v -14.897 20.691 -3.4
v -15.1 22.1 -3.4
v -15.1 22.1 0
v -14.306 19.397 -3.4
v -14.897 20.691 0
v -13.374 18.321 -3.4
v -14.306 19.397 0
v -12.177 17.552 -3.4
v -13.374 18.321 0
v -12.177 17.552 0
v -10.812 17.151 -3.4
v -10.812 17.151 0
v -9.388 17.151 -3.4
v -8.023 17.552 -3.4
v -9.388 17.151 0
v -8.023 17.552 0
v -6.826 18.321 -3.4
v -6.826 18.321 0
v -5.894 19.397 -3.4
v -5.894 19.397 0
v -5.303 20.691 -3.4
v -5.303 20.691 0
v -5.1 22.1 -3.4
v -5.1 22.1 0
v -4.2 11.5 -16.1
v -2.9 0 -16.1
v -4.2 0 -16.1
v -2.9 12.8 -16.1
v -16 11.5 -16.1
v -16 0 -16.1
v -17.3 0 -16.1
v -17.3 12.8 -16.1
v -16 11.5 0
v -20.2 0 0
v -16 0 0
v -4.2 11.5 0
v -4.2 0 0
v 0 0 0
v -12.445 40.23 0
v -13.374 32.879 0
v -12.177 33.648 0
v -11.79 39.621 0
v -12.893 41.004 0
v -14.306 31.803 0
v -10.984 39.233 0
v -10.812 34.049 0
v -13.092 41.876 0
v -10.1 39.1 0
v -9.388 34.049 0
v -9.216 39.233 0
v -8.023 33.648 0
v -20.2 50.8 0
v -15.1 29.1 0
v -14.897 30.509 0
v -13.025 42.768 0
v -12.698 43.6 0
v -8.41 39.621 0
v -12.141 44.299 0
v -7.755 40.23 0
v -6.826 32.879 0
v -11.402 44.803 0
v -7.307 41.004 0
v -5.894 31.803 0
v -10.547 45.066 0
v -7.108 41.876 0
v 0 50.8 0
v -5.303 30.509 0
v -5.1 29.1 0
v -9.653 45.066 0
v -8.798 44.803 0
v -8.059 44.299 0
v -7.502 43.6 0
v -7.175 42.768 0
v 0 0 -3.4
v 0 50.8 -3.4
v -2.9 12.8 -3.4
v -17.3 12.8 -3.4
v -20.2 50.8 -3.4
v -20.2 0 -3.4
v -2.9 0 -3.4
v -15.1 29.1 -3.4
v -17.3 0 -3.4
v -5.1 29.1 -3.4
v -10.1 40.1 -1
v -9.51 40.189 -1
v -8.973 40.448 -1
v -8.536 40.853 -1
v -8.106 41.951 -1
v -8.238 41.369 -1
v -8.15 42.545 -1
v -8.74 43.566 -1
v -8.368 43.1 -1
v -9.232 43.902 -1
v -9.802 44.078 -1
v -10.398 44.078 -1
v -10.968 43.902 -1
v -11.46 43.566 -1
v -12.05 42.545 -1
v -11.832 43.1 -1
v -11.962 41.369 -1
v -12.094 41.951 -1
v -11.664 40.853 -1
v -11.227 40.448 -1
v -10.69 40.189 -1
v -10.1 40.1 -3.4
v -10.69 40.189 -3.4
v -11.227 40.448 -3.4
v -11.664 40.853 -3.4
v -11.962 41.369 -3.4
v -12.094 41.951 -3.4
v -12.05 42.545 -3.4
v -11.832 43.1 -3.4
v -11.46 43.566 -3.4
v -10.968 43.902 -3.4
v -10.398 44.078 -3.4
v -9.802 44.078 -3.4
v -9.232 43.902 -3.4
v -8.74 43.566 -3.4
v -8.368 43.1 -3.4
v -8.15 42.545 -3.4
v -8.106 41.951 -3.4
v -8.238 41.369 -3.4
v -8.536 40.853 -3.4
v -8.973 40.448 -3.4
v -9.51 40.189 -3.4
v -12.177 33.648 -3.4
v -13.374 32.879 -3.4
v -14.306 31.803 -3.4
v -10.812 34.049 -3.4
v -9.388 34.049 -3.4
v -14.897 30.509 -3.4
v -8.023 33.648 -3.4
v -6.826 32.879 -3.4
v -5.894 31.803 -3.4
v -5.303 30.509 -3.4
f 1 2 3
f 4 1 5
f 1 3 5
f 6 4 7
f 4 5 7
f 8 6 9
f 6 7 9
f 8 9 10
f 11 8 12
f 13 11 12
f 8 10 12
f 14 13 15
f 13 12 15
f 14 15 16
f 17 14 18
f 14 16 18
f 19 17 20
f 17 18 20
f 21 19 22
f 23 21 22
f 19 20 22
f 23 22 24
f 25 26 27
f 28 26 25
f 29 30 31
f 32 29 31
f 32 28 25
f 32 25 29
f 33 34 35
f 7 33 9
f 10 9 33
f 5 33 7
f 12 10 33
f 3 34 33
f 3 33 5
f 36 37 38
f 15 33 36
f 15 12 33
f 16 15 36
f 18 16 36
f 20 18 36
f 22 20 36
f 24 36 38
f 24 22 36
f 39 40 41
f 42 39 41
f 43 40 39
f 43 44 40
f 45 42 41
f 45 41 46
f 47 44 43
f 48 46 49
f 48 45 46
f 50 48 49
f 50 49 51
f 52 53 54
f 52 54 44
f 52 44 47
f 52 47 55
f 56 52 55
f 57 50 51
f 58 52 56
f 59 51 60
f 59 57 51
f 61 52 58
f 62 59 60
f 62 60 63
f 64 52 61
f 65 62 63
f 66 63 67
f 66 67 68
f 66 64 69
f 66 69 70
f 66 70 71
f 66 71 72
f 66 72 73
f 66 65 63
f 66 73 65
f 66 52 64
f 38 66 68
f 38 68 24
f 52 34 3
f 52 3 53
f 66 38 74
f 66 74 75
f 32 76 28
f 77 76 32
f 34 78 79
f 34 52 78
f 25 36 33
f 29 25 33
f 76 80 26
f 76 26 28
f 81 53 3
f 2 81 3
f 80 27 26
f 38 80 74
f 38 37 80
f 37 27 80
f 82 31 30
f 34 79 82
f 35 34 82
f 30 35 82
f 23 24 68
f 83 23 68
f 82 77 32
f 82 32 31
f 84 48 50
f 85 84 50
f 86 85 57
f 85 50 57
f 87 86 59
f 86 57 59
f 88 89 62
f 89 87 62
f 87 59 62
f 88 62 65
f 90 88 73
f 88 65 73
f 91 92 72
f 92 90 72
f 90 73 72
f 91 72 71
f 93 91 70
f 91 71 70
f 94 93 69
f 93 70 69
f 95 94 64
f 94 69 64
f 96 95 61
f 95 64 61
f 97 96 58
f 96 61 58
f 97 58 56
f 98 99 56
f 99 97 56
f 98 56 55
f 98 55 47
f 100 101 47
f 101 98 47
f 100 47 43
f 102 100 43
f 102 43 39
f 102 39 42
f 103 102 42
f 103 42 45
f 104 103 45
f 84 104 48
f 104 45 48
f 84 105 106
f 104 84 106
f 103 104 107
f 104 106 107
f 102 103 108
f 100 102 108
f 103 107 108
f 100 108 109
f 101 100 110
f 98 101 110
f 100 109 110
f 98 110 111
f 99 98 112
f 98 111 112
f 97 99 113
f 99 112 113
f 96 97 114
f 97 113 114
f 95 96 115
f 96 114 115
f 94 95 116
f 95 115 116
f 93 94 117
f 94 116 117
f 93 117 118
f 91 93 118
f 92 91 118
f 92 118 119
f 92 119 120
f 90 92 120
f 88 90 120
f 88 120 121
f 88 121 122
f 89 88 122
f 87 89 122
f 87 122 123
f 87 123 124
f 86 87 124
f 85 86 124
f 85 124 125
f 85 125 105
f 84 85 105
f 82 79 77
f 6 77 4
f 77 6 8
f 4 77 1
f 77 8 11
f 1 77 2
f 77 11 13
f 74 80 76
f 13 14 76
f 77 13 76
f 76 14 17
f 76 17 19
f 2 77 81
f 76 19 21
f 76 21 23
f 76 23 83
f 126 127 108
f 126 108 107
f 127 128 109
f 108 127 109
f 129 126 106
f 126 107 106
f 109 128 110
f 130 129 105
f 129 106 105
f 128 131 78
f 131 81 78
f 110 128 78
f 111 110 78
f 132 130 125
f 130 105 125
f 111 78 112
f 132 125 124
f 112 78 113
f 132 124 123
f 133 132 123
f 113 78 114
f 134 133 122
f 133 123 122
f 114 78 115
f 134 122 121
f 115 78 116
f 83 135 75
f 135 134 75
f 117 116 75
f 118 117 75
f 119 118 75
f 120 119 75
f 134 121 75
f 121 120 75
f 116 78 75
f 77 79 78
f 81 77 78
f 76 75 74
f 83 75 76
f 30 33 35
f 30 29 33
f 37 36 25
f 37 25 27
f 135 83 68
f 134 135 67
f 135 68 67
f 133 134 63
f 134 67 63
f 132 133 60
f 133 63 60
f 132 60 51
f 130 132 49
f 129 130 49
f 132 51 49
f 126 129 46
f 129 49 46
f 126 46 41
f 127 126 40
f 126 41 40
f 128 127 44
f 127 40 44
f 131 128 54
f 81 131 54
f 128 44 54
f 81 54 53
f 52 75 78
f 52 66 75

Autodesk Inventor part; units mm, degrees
ref_plane "YZ Plane" through (0, 0, 0) normal (1, 0, 0) x (0, 1, 0)
ref_plane "XZ Plane" through (0, 0, 0) normal (0, 1, 0) x (-1, 0, 0)
ref_plane "XY Plane" through (0, 0, 0) normal (0, 0, 1) x (1, 0, 0)
sketch "Boceto1" plane through (0, 0, 0) normal (0, 0, 1) x (1, 0, 0)
  line L0 (0, 50.8) -> (-20.2, 50.8)
  line L1 (-20.2, 50.8) -> (-20.2, 0)
  line L2 (-20.2, 0) -> (0, 0)
  line L3 (0, 0) -> (0, 50.8)
  dimension "d0" = 50.8
  dimension "d1" = 20.2
extrude "Extrusión1" add sketch "Boceto1" against normal blind 3.4
sketch "Boceto3" plane through (0, 0, 0) normal (0, 0, -1) x (-1, 0, 0)
  line L0 (20.2, 50.8) -> (0, 50.8) construction
  line L1 (0, 50.8) -> (0, 0) construction
  circle A0 centre (10.1, 42.1) radius 2
  line L2 (20.2, 0) -> (20.2, 50.8) projected
  dimension "d20" = 4
  dimension "d21" = 10.1
  dimension "d23" = 8.7
hole "Agujero3" at (-10.1, 42.1, 0) direction (0, 0, -1) diameter 4 end through all countersink diameter 6 countersink angle 90
sketch "Boceto5" plane through (0, 0, 0) normal (0, 0, -1) x (-1, 0, 0)
  line L0 (10.1, 29.1) -> (10.1, 22.1) construction
  line L1 (15.1, 29.1) -> (15.1, 22.1)
  line L2 (5.1, 22.1) -> (5.1, 29.1)
  arc A0 (15.1, 29.1) -> (5.1, 29.1) centre (10.1, 29.1) ccw
  arc A1 (5.1, 22.1) -> (15.1, 22.1) centre (10.1, 22.1) ccw
  circle A2 centre (10.1, 42.1) radius 3 projected
  line L3 (0, 50.8) -> (0, 0) projected
  point P0 (10.1, 25.6)
  point P1 (10.1, 17.1)
  point P2 (10.1, 34.1)
  dimension "d31" = 10
  dimension "d32" = 17
  dimension "d34" = 5.1
extrude "Extrusión2" cut sketch "Boceto5" along normal through all contours L1 A1 L2 A0
sketch "Boceto6" plane through (0, 0, -3.4) normal (0, 0, -1) x (-1, 0, 0)
  line L0 (0, 0) -> (20.2, 0) projected
  line L1 (2.9, 0) -> (2.9, 12.8)
  line L2 (2.9, 12.8) -> (17.3, 12.8)
  line L3 (17.3, 12.8) -> (17.3, 0)
  line L4 (16, 0) -> (16, 11.5)
  line L5 (16, 11.5) -> (4.2, 11.5)
  line L6 (4.2, 11.5) -> (4.2, 0)
  line L7 (0, 50.8) -> (0, 0) projected
  line L8 (20.2, 0) -> (20.2, 50.8) projected
  point P0 (4.2, 0)
  point P1 (16, 0)
  dimension "d37" = 12.8
  dimension "d40" = 1.3
  dimension "d50" = 14.4
  dimension "d51" = 2.9
  dimension "d52" = 2.9
extrude "Extrusión3" add sketch "Boceto6" along normal blind 12.7 contours L1 L2 L3 L0 L4 L5 L6
sketch "Boceto7" plane through (0, 0, -3.4) normal (0, 0, -1) x (-1, 0, 0)
  line L0 (16, 11.5) -> (16, 0) projected
  line L1 (4.2, 11.5) -> (16, 11.5)
  line L2 (16, 11.5) -> (16, 0)
  line L3 (16, 0) -> (4.2, 0)
  line L4 (4.2, 0) -> (4.2, 11.5)
  point P0 (0, 0)
  point P1 (16, 11.5)
extrude "Extrusión4" cut sketch "Boceto7" against normal blind 10
properties part number "PLASTICO" material "Plástico ABS"
